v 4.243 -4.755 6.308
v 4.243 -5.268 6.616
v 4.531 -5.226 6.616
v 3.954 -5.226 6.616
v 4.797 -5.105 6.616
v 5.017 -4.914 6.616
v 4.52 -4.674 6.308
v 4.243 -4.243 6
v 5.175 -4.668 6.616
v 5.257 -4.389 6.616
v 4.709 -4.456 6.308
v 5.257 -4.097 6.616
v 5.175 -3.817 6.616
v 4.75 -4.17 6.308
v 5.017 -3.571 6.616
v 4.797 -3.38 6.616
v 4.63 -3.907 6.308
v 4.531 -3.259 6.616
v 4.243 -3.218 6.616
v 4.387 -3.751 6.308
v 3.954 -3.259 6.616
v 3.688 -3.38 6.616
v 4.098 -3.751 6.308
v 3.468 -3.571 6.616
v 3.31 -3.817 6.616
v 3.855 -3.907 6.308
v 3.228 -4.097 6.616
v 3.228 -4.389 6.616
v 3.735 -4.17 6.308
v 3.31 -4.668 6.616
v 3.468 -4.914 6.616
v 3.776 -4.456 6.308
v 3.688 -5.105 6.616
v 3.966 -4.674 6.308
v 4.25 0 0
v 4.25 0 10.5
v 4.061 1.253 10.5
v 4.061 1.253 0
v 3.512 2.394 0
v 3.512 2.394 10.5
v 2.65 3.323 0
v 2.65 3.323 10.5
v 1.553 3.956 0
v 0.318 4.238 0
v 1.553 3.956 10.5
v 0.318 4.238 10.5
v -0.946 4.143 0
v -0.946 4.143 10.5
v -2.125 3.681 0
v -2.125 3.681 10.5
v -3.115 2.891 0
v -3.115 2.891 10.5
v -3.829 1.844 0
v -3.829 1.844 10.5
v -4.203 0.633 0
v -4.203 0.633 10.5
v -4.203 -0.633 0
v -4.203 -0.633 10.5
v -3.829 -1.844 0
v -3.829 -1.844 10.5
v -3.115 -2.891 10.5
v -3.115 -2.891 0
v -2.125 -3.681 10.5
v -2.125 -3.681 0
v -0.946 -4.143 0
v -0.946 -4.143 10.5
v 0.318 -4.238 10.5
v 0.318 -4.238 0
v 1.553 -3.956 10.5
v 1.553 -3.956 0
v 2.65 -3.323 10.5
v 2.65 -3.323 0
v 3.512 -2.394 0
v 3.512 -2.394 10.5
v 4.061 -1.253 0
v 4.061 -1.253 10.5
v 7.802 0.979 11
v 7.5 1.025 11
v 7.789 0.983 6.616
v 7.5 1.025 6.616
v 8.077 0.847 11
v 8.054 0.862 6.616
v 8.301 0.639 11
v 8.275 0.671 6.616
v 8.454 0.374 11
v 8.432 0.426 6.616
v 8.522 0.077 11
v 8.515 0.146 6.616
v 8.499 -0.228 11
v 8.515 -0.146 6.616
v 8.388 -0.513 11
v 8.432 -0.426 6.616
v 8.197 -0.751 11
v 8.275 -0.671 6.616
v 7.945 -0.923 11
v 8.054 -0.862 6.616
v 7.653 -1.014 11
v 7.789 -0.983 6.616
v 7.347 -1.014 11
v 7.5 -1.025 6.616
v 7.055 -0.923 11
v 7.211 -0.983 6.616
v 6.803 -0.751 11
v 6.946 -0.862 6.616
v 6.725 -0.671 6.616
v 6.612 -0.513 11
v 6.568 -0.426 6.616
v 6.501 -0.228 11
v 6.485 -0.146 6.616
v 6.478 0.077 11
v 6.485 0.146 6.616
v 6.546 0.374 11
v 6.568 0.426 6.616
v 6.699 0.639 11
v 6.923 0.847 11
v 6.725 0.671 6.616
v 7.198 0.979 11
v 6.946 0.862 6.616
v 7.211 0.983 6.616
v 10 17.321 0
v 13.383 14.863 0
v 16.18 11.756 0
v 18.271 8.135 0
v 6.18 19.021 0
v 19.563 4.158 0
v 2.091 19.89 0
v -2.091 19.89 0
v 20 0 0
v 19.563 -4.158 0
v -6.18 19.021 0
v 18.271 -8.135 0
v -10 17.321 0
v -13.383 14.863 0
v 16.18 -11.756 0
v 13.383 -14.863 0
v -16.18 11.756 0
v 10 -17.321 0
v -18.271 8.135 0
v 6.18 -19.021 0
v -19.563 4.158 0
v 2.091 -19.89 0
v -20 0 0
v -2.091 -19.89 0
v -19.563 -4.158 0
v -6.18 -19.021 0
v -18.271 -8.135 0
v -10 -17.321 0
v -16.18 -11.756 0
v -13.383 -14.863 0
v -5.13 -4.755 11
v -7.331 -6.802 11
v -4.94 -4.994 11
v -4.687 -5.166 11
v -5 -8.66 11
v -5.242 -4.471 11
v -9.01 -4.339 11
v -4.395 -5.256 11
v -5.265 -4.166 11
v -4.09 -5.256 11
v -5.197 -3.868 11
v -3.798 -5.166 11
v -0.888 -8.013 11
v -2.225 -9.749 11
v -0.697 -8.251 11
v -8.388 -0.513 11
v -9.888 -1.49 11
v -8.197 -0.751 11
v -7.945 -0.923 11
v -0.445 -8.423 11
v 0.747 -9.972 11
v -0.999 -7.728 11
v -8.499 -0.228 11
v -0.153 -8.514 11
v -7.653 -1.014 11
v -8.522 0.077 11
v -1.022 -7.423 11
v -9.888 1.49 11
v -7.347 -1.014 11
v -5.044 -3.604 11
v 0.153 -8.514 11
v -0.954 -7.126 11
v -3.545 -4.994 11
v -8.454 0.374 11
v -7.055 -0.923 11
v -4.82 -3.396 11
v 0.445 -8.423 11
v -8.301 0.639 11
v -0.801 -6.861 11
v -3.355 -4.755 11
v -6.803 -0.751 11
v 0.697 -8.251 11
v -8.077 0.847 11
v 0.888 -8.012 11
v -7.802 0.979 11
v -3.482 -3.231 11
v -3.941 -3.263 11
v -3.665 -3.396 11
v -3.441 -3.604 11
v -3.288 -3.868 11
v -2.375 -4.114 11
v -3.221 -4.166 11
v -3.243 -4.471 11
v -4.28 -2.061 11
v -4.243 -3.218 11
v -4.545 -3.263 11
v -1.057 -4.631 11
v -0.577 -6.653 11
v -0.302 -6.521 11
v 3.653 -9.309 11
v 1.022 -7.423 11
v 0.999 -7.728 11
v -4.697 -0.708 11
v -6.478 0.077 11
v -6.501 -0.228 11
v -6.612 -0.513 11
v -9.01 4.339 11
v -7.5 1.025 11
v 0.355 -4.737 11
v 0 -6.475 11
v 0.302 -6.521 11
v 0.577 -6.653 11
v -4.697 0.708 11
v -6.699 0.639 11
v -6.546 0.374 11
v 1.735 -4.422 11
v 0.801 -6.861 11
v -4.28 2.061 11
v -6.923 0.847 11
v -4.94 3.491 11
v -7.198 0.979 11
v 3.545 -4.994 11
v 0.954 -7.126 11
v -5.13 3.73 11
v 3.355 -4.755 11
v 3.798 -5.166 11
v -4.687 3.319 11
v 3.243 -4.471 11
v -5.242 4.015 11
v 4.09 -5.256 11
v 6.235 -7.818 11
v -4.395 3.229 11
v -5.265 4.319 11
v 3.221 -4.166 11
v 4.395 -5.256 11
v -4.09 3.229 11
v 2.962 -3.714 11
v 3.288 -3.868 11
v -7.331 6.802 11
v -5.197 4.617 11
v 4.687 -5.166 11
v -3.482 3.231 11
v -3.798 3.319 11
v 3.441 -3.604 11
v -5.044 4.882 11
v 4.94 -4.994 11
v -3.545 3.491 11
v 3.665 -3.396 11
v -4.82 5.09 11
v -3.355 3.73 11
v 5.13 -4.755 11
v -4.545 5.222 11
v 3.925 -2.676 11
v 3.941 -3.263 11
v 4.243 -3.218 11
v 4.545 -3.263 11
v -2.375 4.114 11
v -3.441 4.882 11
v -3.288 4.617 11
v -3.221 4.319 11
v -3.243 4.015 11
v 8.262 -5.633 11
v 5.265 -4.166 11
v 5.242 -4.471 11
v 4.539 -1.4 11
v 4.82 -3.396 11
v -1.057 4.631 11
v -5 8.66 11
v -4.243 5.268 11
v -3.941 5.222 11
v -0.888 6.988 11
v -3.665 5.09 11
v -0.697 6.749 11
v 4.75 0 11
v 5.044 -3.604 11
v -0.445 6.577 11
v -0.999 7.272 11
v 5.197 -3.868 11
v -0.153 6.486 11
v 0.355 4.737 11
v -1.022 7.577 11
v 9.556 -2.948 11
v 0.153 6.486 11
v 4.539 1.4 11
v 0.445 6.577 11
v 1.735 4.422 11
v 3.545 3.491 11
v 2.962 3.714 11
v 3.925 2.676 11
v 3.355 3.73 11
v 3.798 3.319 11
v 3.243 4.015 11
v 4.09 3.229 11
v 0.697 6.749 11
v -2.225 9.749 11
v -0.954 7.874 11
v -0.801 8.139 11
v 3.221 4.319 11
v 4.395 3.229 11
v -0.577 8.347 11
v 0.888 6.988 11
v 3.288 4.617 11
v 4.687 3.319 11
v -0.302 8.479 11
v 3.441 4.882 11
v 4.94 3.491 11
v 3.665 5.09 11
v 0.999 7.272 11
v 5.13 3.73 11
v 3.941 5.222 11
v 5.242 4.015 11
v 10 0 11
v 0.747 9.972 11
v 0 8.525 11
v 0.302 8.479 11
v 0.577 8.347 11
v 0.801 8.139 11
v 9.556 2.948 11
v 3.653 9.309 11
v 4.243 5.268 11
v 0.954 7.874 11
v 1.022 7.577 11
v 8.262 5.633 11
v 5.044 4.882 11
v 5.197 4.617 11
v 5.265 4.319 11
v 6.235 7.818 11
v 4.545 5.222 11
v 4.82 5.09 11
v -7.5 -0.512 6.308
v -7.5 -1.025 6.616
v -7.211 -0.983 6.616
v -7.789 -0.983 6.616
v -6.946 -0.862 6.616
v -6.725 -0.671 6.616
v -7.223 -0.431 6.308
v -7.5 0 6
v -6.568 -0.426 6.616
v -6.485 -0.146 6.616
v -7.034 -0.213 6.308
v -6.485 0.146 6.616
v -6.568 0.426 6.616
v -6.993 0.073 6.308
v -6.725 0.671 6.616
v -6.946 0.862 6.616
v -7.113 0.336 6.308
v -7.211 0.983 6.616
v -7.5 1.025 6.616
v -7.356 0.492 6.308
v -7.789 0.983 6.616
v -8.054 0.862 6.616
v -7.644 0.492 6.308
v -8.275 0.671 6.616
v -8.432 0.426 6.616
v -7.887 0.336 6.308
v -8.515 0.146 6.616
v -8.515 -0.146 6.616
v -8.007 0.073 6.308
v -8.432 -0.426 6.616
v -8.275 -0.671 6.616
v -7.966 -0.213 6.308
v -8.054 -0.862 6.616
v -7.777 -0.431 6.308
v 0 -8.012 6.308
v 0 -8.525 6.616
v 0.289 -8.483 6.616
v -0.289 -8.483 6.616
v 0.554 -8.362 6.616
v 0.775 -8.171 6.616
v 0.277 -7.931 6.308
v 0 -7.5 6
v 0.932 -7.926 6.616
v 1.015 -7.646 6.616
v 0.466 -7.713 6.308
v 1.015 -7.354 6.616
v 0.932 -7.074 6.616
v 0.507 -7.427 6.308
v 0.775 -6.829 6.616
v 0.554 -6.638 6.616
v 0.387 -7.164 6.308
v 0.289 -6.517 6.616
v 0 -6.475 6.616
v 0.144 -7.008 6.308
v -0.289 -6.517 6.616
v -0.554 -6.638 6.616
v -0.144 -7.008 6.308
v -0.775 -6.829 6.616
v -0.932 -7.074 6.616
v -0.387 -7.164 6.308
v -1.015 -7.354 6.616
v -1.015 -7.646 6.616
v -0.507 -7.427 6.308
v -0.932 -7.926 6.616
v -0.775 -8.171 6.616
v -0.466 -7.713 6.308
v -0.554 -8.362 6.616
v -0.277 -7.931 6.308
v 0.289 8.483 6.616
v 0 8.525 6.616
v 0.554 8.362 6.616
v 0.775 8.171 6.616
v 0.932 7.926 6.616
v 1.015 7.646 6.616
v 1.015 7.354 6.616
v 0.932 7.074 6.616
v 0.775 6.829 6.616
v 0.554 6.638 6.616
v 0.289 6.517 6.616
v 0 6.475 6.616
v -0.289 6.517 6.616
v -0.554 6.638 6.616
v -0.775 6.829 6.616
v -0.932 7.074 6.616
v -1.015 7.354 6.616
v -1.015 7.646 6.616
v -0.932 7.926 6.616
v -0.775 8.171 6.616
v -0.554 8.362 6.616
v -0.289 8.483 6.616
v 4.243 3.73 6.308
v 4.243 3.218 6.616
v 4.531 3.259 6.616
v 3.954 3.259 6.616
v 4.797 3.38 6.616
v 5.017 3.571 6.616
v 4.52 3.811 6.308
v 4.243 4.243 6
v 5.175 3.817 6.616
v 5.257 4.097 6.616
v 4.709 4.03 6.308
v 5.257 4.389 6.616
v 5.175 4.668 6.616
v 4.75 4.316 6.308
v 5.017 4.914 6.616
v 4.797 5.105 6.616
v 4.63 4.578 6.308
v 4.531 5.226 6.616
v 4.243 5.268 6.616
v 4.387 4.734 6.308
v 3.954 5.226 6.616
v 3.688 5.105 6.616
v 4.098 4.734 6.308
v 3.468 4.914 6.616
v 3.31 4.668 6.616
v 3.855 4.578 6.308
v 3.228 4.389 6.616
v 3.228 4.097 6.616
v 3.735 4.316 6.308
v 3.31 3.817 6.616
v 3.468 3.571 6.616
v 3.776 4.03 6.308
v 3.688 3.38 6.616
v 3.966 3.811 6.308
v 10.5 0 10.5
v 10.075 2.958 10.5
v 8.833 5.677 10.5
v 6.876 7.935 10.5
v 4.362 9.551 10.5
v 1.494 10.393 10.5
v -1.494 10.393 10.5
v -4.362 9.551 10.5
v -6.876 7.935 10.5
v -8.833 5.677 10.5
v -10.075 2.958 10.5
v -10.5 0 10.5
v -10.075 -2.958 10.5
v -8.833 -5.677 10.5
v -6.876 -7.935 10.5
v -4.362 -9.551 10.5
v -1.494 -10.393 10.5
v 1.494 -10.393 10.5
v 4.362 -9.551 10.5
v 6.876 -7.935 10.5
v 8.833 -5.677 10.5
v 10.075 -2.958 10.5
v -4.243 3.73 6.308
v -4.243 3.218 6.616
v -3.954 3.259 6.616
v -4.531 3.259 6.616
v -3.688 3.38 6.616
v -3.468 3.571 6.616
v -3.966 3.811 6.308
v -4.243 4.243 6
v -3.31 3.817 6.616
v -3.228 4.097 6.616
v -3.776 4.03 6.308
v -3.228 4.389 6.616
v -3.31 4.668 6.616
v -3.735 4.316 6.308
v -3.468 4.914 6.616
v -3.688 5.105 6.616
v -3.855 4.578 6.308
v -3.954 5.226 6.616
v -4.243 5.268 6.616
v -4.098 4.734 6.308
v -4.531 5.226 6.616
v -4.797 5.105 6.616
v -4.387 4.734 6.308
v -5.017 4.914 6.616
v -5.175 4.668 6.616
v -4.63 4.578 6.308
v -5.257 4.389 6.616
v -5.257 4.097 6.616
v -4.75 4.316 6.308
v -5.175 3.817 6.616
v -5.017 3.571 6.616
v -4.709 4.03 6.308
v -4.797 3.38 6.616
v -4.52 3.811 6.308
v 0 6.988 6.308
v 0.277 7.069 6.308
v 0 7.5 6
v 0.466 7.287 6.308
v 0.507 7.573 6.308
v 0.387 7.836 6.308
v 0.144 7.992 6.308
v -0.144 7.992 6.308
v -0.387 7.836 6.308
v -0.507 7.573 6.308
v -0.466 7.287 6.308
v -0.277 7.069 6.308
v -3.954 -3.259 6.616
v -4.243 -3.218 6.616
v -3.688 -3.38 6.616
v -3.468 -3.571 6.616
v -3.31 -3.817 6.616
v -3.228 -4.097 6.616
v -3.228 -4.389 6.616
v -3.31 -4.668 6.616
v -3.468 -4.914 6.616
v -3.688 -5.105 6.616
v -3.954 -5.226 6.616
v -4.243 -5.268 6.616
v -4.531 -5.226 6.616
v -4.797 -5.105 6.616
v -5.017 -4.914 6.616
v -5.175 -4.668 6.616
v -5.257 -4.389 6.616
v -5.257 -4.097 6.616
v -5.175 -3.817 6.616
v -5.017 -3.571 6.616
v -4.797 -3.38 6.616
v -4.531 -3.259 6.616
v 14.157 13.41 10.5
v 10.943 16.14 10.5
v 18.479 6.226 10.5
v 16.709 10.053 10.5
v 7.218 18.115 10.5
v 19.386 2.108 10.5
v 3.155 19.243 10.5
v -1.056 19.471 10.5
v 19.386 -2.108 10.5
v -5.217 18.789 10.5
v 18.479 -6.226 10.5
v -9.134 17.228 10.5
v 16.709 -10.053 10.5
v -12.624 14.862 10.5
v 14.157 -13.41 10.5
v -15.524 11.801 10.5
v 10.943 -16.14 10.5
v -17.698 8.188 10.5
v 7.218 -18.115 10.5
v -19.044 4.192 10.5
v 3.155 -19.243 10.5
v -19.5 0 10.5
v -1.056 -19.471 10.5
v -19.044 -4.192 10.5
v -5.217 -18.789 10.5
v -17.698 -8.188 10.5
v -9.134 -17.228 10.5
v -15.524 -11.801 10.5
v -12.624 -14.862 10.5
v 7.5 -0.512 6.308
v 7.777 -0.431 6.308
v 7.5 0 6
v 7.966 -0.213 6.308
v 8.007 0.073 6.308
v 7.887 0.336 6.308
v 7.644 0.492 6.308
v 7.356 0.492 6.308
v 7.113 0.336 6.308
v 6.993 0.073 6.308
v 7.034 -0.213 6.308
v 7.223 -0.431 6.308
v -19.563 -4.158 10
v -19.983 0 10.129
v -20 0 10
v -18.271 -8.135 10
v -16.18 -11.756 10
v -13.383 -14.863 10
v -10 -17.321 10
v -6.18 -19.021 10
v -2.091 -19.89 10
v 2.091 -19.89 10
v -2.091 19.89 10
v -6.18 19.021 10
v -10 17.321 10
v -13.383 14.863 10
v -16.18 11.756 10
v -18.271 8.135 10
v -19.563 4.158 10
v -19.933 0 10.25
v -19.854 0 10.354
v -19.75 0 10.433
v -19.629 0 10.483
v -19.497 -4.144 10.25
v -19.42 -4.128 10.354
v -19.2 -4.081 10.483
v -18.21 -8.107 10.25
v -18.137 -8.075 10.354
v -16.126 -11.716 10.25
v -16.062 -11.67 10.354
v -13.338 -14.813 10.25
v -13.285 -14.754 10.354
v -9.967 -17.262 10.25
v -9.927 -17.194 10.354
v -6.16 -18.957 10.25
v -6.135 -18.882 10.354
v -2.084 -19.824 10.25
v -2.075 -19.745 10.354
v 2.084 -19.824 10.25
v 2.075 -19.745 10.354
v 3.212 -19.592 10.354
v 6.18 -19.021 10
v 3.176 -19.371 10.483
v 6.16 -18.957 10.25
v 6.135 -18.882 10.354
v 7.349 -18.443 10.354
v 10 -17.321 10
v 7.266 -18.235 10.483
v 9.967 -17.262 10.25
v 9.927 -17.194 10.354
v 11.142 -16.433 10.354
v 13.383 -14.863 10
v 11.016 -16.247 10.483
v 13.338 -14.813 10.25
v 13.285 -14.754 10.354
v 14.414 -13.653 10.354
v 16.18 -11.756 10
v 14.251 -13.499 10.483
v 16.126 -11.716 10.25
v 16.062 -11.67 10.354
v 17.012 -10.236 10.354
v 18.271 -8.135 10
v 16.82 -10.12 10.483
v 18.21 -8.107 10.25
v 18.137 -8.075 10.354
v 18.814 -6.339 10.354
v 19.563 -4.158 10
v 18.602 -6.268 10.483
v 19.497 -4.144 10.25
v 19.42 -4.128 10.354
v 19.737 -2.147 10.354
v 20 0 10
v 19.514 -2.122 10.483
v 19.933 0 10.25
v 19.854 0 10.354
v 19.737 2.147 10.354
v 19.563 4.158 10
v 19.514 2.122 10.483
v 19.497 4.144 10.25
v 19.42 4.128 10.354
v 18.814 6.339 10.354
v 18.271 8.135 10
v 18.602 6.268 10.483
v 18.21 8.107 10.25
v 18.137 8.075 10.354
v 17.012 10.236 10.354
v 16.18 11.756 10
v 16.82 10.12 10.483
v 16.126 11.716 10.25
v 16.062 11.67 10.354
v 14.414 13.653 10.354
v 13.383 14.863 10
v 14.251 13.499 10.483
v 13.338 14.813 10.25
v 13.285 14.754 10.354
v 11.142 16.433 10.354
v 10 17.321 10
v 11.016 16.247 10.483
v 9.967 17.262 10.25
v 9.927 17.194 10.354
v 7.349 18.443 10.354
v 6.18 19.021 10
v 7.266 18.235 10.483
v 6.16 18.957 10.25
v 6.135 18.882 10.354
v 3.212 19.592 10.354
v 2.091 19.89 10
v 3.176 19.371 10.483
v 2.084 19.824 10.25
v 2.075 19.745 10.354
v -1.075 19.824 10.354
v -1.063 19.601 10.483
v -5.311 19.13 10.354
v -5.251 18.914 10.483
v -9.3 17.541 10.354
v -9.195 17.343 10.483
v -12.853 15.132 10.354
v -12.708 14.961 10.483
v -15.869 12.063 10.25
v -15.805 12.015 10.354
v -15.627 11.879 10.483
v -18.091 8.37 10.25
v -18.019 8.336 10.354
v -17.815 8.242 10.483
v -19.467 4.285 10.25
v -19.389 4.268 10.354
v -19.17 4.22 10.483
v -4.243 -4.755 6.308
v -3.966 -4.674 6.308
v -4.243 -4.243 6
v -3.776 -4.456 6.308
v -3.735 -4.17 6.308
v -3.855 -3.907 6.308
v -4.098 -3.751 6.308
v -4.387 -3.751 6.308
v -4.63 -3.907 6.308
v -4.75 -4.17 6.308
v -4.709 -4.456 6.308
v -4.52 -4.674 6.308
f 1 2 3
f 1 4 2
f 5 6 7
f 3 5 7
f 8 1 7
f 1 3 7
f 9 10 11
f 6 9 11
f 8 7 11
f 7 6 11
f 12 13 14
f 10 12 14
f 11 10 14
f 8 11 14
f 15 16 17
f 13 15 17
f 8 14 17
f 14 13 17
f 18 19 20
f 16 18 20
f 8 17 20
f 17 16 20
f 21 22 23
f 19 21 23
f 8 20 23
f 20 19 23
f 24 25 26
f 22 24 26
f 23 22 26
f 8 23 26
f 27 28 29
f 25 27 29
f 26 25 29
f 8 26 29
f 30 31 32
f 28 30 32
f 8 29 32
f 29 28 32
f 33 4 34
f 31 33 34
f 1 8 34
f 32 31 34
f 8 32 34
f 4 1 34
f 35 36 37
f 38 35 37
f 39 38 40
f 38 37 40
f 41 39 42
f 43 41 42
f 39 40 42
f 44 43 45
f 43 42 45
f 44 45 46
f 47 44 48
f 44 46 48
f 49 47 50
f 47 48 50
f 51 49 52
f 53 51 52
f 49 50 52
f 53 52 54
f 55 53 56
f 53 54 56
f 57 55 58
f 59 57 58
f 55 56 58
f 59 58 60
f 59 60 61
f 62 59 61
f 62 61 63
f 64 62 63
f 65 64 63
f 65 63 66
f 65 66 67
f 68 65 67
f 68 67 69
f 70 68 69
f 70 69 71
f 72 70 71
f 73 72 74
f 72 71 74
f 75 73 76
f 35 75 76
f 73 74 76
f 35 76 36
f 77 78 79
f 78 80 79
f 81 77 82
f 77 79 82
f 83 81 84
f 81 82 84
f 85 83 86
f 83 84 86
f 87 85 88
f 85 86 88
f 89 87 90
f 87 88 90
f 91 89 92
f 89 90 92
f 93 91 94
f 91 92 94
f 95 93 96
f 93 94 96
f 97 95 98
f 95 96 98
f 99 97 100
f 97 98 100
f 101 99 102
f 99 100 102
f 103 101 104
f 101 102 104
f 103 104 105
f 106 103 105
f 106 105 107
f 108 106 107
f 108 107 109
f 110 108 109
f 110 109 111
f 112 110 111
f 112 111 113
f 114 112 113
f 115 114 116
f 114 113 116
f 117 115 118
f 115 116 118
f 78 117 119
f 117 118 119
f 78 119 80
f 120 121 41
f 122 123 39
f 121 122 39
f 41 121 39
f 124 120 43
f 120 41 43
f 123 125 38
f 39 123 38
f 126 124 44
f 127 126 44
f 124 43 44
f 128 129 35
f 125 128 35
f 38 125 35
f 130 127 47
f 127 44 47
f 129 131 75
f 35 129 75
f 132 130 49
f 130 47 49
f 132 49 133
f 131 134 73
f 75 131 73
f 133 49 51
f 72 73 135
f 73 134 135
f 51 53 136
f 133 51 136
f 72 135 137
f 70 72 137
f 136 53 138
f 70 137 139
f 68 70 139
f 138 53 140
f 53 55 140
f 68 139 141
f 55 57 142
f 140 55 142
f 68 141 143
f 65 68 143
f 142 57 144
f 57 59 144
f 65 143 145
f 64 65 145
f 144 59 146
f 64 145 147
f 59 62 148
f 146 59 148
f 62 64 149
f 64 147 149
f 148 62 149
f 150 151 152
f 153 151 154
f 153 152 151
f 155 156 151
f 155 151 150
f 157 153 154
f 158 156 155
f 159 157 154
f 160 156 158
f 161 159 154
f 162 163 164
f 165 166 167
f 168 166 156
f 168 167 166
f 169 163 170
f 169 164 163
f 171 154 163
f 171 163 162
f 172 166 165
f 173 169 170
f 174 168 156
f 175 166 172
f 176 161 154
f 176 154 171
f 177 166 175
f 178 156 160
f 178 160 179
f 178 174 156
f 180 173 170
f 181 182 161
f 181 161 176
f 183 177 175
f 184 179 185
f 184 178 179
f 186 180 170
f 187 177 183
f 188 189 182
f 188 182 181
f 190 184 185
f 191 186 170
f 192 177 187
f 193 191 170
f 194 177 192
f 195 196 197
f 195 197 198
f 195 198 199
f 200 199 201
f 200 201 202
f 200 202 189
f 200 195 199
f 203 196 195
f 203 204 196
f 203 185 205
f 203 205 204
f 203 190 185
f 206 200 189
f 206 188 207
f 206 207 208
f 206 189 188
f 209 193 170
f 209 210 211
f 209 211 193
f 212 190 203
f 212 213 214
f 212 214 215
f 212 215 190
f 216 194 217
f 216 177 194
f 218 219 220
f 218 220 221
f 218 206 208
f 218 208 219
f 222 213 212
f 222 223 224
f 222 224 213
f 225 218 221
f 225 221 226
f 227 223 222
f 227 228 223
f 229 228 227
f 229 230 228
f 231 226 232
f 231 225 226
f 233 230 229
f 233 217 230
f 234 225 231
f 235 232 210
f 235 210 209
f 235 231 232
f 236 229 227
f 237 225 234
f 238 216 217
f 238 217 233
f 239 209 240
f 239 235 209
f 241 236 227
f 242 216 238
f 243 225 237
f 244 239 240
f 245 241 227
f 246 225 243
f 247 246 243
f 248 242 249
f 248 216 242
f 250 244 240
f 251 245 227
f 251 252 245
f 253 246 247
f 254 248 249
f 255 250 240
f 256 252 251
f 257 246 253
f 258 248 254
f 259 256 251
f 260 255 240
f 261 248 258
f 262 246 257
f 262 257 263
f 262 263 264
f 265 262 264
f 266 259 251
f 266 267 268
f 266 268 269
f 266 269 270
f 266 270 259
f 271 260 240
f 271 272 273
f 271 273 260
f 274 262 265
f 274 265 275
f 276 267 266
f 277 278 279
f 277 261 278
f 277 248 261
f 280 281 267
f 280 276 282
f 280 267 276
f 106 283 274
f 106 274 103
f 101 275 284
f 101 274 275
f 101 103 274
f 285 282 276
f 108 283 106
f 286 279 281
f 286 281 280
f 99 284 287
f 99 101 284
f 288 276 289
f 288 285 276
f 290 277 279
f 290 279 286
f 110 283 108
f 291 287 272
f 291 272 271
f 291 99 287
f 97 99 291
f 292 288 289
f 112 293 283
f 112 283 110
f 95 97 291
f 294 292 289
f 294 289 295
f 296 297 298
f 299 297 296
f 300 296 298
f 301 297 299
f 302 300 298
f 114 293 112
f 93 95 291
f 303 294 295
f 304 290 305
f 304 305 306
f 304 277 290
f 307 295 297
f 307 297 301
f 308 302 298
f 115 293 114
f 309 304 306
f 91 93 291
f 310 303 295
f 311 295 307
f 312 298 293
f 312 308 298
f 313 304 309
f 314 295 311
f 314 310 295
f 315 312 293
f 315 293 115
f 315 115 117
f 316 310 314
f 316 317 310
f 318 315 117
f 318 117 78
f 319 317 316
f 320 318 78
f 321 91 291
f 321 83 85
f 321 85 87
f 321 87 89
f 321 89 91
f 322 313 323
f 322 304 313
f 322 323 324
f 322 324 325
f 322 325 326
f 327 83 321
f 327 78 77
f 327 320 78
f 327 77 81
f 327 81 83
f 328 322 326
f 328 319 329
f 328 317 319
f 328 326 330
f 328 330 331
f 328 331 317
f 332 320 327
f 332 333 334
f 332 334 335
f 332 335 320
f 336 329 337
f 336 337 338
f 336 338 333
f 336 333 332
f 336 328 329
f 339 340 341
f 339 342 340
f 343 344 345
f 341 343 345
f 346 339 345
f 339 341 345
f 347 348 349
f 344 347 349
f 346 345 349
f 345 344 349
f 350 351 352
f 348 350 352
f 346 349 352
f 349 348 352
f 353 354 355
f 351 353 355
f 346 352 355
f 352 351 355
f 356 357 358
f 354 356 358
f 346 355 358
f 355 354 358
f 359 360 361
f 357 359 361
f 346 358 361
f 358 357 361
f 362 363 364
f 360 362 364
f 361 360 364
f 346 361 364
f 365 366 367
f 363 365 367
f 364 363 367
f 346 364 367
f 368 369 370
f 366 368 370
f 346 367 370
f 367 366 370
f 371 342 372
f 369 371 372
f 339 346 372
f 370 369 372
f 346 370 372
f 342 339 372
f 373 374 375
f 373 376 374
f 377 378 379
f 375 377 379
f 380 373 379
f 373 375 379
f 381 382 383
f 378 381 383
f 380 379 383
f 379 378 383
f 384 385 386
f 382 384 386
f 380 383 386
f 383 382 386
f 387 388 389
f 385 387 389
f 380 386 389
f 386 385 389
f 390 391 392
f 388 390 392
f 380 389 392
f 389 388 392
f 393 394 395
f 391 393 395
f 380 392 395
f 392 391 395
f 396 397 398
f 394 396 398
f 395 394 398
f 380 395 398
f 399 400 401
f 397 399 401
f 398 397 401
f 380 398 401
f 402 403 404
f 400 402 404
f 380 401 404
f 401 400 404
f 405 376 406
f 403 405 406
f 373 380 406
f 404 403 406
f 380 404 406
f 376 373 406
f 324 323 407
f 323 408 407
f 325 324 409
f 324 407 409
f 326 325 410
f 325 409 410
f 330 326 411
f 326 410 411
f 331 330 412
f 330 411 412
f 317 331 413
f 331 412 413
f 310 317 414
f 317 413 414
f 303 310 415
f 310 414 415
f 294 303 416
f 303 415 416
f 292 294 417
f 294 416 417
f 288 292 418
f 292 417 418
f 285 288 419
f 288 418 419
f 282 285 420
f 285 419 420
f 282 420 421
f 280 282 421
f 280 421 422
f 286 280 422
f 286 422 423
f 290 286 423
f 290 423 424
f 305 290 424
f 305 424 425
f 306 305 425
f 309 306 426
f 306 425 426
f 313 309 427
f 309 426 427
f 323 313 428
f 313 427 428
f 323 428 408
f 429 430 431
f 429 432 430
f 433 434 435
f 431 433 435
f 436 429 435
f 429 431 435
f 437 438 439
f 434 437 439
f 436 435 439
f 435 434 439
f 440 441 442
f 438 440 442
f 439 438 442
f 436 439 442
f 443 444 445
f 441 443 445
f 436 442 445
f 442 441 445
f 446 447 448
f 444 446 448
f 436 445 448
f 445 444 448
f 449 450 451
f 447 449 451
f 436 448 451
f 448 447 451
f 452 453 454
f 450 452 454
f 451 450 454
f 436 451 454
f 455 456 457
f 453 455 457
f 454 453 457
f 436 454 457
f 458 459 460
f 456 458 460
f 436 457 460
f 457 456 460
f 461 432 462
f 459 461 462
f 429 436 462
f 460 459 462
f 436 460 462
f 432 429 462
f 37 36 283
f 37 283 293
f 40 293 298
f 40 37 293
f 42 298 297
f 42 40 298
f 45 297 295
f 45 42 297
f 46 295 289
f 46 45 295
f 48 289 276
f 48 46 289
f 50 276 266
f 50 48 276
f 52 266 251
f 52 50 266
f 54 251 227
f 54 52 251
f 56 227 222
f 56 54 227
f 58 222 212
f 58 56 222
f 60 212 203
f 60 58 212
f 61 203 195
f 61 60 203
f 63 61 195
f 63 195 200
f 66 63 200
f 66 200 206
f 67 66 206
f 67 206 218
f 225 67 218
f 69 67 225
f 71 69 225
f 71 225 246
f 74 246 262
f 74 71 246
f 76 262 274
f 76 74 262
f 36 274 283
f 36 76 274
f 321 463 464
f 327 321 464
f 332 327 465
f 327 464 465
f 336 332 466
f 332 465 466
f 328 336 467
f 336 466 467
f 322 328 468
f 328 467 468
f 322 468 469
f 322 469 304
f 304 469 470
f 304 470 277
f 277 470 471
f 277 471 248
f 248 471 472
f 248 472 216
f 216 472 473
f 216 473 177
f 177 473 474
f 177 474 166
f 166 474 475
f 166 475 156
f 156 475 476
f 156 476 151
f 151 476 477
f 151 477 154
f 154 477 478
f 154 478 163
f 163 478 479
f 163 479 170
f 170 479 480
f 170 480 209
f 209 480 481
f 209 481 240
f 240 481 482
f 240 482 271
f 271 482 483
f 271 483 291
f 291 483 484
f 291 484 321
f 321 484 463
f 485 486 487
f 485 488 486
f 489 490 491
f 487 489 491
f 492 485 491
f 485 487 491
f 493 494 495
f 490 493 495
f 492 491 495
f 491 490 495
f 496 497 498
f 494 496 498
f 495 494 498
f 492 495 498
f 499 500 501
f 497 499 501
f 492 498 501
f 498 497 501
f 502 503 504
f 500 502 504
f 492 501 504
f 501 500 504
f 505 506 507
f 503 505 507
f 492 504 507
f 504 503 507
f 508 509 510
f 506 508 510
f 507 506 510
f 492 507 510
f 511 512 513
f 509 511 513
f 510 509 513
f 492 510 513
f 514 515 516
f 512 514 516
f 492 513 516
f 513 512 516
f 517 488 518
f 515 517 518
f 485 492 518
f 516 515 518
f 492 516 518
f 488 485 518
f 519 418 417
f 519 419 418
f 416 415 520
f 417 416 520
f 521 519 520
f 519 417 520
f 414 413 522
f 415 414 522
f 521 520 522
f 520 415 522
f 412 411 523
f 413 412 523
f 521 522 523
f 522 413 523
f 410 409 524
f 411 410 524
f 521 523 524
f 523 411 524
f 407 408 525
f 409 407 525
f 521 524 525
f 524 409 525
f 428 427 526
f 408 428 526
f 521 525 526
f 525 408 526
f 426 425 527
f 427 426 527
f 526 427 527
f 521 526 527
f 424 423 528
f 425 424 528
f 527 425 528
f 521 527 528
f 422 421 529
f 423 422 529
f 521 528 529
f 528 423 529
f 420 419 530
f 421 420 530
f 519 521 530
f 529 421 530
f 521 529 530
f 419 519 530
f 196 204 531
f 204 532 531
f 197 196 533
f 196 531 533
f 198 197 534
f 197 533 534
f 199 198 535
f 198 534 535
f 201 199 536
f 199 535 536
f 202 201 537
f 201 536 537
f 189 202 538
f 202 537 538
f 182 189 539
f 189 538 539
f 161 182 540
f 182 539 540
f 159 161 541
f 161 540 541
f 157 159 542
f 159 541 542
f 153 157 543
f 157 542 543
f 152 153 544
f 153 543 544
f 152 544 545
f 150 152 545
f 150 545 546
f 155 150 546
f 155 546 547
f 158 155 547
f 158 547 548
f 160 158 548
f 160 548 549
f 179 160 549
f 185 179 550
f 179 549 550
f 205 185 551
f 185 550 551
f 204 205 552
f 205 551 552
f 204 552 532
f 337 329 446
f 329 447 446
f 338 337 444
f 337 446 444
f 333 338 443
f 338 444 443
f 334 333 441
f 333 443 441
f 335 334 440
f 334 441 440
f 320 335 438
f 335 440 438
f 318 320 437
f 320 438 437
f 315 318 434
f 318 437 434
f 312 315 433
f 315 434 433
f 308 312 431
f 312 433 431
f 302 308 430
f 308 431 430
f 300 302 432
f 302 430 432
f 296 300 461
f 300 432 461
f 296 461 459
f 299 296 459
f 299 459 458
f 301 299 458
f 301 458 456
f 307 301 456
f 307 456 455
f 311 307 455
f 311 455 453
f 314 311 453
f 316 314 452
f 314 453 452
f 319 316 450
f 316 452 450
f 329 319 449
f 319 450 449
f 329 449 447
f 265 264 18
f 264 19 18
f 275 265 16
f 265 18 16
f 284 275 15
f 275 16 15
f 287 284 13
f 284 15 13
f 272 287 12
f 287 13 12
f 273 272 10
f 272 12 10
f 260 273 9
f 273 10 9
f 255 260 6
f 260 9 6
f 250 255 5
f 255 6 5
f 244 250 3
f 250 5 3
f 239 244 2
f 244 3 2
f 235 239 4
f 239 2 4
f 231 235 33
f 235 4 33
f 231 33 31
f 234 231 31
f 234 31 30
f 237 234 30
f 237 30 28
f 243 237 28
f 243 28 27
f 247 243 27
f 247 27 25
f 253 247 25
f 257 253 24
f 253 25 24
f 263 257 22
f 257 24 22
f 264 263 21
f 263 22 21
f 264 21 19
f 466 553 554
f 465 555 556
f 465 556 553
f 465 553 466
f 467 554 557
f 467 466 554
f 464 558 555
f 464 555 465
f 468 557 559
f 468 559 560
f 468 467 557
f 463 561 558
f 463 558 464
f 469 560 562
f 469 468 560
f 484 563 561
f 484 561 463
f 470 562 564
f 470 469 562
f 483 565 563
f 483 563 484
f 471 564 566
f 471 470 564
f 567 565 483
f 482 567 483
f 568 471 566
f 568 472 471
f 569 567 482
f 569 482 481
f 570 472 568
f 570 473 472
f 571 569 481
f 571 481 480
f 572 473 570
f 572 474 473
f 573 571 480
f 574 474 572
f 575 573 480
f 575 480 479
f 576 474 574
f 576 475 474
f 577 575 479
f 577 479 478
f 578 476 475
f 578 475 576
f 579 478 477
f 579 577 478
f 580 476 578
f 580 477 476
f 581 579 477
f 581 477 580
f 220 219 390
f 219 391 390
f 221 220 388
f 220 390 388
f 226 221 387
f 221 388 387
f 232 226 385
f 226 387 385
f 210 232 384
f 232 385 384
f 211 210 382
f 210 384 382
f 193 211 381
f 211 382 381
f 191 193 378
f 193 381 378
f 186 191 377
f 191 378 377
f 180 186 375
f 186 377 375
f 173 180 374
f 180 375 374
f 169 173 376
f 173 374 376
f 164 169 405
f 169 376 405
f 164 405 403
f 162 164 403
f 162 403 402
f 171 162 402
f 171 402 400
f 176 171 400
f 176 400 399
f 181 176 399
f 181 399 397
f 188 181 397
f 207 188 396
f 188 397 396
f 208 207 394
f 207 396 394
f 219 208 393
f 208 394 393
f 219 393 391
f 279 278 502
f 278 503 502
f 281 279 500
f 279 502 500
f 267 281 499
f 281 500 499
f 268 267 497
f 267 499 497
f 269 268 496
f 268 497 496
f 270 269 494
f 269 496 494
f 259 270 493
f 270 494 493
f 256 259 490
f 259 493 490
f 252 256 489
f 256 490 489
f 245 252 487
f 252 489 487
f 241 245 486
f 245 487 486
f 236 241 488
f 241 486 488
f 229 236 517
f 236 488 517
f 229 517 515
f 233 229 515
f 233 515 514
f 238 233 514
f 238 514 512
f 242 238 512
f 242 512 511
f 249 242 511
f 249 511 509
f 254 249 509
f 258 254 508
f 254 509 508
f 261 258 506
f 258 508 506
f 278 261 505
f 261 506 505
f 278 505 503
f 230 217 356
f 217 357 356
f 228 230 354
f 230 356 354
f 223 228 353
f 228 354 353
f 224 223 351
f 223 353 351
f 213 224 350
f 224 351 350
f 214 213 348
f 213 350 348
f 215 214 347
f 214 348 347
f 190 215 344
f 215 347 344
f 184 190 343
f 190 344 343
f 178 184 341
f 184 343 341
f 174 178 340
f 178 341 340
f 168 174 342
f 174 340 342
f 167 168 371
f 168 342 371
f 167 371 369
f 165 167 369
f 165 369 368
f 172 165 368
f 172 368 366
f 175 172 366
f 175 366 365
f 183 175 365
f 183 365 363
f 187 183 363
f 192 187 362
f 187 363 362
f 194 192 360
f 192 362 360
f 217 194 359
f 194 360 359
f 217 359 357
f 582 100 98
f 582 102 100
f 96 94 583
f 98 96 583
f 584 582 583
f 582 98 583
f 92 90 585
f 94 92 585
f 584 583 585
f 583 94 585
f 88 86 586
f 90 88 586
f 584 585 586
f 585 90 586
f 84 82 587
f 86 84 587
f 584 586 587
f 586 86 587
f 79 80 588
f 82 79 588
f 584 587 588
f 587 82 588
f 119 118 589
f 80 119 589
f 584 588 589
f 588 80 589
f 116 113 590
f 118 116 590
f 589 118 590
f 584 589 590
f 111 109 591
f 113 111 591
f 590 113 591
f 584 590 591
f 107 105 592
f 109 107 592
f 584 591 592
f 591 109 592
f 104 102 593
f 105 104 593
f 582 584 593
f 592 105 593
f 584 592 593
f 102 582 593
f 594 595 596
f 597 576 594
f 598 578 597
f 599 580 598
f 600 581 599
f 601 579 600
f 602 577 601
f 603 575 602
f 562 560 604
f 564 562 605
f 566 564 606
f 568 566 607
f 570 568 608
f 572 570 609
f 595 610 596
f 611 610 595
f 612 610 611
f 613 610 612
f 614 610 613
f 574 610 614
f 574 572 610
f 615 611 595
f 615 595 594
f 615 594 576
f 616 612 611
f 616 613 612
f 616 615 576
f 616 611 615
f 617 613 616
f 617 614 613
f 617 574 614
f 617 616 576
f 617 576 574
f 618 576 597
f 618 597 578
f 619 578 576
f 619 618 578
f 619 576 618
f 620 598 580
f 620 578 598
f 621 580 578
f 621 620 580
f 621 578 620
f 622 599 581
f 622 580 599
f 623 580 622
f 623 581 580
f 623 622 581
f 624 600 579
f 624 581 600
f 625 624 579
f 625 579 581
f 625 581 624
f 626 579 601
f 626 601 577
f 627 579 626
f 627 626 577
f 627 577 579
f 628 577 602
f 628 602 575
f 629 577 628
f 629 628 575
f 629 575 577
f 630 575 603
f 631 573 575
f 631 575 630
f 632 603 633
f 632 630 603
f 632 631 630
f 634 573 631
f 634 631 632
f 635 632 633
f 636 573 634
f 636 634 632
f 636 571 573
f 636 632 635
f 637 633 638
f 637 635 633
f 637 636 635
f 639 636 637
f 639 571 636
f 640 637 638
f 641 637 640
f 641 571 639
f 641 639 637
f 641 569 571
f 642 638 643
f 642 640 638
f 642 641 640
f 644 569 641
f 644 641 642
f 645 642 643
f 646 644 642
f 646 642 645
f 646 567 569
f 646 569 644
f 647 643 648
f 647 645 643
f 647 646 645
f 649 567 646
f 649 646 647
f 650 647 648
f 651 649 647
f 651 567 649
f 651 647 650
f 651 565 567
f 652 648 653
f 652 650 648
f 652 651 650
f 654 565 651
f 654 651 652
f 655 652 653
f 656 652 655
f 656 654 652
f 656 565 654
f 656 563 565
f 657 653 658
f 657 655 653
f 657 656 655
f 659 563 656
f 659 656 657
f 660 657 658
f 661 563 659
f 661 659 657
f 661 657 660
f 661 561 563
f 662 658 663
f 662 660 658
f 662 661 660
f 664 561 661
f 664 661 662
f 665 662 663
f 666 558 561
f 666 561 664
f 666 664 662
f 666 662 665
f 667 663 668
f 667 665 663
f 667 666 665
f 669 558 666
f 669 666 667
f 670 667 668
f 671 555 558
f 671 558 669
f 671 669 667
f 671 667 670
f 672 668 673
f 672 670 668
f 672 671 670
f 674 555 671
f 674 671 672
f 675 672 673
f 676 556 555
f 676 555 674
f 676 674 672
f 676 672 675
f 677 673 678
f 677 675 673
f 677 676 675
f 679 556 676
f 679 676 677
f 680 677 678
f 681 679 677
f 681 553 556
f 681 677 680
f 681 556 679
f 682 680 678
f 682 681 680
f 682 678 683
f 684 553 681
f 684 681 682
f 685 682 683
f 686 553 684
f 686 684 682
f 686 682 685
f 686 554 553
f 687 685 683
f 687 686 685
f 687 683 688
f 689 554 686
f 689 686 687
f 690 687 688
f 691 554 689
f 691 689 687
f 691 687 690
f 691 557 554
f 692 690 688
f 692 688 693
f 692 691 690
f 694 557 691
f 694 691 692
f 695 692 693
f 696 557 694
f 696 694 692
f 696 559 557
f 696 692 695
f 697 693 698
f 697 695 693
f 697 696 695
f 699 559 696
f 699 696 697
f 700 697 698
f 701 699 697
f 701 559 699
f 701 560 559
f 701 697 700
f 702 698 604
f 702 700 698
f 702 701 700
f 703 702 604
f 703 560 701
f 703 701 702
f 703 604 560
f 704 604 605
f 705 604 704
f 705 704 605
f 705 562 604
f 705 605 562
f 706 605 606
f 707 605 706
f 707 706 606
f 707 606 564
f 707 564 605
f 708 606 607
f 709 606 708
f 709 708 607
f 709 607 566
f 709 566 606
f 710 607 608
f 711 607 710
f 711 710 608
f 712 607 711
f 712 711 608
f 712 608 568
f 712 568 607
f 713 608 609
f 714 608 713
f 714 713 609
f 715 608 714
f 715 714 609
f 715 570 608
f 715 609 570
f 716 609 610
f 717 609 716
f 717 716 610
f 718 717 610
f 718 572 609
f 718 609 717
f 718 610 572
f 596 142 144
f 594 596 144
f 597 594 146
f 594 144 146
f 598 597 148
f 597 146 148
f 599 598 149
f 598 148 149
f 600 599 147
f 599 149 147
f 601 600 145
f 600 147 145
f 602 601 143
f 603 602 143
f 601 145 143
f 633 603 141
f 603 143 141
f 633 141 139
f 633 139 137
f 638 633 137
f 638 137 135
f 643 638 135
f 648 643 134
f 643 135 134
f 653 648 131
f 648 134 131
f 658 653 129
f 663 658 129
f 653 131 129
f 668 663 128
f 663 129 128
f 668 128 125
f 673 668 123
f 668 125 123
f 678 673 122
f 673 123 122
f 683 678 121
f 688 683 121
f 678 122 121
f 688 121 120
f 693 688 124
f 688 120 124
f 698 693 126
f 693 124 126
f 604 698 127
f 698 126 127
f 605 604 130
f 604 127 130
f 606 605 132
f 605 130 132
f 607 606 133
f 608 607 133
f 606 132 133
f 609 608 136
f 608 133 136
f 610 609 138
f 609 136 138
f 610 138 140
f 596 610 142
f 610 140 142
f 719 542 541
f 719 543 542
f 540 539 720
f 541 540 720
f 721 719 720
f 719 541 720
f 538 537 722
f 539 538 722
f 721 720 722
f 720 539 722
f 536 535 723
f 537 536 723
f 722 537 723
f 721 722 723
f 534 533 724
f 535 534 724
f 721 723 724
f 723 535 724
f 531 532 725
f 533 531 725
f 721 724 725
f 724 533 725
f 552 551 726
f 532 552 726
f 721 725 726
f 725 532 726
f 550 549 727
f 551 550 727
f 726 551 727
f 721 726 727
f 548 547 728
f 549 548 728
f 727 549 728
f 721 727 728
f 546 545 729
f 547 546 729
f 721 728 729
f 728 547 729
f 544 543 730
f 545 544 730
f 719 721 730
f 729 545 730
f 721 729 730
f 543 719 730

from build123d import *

# Parameters (mm, degrees)
SKETCH1_R                    = 20
BOSS_EXTRUDE1_DEPTH          = 10.5
SKETCH2_R                    = 10.5
SKETCH2_R_2                  = 4.25
BOSS_EXTRUDE3_DEPTH          = 0.5
BOSS_EXTRUDE3_DRAFT          = 45
SKETCH3_R                    = 4.25
CUT_EXTRUDE1_DEPTH           = 10.5
M2_5X0_45_TAPPED_HOLE1_D     = 2.05
M2_5X0_45_TAPPED_HOLE1_DEPTH = 4.384117865
M2_5X0_45_TAPPED_HOLE1_TIP   = 0.615882135
FILLET1_R                    = 0.5


with BuildPart() as part:
    # Sketch1 → Boss-Extrude1 (new body)
    with BuildSketch(Plane(origin=(0, 0, 0), x_dir=(0, 1, 0), z_dir=(0, 0, 1))):
        with Locations(Location((0, 0, 0), (0, 0, 90))):
            Circle(SKETCH1_R)
    extrude(amount=BOSS_EXTRUDE1_DEPTH)


with BuildPart() as boss_extrude3_tool:
    # Sketch2 → Boss-Extrude3 (with draft: the straight prism first)
    with BuildSketch(Plane.XY.offset(10.5)):
        Circle(SKETCH2_R)
        Circle(SKETCH2_R_2, mode=Mode.SUBTRACT)
    extrude(amount=BOSS_EXTRUDE3_DEPTH)
    # Boss-Extrude3: the draft: its side faces are tilted about the plane it starts from
    boss_extrude3_sides = [boss_extrude3_tool.faces().sort_by_distance(p)[0] for p in [
        (-10.5, 0, 10.75),
        (-4.25, 0, 10.75),
    ]]
    draft(boss_extrude3_sides, Plane.XY.offset(10.5), BOSS_EXTRUDE3_DRAFT)


with BuildPart() as part_1:
    add(part.part)

    # Boss-Extrude3: add boss_extrude3_tool
    add(boss_extrude3_tool.part)

    # Sketch3 → Cut-Extrude1 (cut)
    with BuildSketch(Plane.XY.offset(10.5)):
        Circle(SKETCH3_R)
    extrude(amount=-CUT_EXTRUDE1_DEPTH, mode=Mode.SUBTRACT)

    # M2.5x0.45 Tapped Hole1
    with Locations(Plane(origin=(0, 0, 11), x_dir=(0, -1, 0), z_dir=(0, 0, 1))):
        with Locations((4.242640687, -4.242640687), (-7.5, 0), (0, -7.5), (7.5, 0), (0, 7.5), (4.242640687, 4.242640687), (-4.242640687, 4.242640687), (-4.242640687, -4.242640687)):
            Hole(M2_5X0_45_TAPPED_HOLE1_D / 2, depth=M2_5X0_45_TAPPED_HOLE1_DEPTH)
            with Locations((0, 0, -(M2_5X0_45_TAPPED_HOLE1_DEPTH + M2_5X0_45_TAPPED_HOLE1_TIP / 2))):  # 118° drill point
                Cone(0, M2_5X0_45_TAPPED_HOLE1_D / 2, M2_5X0_45_TAPPED_HOLE1_TIP, mode=Mode.SUBTRACT)

    # Fillet1
    fillet1_edges = [part_1.edges().sort_by_distance(p)[0] for p in [
        (20, 0, 10.5),
    ]]
    fillet(fillet1_edges, radius=FILLET1_R)


solid = part_1.part
